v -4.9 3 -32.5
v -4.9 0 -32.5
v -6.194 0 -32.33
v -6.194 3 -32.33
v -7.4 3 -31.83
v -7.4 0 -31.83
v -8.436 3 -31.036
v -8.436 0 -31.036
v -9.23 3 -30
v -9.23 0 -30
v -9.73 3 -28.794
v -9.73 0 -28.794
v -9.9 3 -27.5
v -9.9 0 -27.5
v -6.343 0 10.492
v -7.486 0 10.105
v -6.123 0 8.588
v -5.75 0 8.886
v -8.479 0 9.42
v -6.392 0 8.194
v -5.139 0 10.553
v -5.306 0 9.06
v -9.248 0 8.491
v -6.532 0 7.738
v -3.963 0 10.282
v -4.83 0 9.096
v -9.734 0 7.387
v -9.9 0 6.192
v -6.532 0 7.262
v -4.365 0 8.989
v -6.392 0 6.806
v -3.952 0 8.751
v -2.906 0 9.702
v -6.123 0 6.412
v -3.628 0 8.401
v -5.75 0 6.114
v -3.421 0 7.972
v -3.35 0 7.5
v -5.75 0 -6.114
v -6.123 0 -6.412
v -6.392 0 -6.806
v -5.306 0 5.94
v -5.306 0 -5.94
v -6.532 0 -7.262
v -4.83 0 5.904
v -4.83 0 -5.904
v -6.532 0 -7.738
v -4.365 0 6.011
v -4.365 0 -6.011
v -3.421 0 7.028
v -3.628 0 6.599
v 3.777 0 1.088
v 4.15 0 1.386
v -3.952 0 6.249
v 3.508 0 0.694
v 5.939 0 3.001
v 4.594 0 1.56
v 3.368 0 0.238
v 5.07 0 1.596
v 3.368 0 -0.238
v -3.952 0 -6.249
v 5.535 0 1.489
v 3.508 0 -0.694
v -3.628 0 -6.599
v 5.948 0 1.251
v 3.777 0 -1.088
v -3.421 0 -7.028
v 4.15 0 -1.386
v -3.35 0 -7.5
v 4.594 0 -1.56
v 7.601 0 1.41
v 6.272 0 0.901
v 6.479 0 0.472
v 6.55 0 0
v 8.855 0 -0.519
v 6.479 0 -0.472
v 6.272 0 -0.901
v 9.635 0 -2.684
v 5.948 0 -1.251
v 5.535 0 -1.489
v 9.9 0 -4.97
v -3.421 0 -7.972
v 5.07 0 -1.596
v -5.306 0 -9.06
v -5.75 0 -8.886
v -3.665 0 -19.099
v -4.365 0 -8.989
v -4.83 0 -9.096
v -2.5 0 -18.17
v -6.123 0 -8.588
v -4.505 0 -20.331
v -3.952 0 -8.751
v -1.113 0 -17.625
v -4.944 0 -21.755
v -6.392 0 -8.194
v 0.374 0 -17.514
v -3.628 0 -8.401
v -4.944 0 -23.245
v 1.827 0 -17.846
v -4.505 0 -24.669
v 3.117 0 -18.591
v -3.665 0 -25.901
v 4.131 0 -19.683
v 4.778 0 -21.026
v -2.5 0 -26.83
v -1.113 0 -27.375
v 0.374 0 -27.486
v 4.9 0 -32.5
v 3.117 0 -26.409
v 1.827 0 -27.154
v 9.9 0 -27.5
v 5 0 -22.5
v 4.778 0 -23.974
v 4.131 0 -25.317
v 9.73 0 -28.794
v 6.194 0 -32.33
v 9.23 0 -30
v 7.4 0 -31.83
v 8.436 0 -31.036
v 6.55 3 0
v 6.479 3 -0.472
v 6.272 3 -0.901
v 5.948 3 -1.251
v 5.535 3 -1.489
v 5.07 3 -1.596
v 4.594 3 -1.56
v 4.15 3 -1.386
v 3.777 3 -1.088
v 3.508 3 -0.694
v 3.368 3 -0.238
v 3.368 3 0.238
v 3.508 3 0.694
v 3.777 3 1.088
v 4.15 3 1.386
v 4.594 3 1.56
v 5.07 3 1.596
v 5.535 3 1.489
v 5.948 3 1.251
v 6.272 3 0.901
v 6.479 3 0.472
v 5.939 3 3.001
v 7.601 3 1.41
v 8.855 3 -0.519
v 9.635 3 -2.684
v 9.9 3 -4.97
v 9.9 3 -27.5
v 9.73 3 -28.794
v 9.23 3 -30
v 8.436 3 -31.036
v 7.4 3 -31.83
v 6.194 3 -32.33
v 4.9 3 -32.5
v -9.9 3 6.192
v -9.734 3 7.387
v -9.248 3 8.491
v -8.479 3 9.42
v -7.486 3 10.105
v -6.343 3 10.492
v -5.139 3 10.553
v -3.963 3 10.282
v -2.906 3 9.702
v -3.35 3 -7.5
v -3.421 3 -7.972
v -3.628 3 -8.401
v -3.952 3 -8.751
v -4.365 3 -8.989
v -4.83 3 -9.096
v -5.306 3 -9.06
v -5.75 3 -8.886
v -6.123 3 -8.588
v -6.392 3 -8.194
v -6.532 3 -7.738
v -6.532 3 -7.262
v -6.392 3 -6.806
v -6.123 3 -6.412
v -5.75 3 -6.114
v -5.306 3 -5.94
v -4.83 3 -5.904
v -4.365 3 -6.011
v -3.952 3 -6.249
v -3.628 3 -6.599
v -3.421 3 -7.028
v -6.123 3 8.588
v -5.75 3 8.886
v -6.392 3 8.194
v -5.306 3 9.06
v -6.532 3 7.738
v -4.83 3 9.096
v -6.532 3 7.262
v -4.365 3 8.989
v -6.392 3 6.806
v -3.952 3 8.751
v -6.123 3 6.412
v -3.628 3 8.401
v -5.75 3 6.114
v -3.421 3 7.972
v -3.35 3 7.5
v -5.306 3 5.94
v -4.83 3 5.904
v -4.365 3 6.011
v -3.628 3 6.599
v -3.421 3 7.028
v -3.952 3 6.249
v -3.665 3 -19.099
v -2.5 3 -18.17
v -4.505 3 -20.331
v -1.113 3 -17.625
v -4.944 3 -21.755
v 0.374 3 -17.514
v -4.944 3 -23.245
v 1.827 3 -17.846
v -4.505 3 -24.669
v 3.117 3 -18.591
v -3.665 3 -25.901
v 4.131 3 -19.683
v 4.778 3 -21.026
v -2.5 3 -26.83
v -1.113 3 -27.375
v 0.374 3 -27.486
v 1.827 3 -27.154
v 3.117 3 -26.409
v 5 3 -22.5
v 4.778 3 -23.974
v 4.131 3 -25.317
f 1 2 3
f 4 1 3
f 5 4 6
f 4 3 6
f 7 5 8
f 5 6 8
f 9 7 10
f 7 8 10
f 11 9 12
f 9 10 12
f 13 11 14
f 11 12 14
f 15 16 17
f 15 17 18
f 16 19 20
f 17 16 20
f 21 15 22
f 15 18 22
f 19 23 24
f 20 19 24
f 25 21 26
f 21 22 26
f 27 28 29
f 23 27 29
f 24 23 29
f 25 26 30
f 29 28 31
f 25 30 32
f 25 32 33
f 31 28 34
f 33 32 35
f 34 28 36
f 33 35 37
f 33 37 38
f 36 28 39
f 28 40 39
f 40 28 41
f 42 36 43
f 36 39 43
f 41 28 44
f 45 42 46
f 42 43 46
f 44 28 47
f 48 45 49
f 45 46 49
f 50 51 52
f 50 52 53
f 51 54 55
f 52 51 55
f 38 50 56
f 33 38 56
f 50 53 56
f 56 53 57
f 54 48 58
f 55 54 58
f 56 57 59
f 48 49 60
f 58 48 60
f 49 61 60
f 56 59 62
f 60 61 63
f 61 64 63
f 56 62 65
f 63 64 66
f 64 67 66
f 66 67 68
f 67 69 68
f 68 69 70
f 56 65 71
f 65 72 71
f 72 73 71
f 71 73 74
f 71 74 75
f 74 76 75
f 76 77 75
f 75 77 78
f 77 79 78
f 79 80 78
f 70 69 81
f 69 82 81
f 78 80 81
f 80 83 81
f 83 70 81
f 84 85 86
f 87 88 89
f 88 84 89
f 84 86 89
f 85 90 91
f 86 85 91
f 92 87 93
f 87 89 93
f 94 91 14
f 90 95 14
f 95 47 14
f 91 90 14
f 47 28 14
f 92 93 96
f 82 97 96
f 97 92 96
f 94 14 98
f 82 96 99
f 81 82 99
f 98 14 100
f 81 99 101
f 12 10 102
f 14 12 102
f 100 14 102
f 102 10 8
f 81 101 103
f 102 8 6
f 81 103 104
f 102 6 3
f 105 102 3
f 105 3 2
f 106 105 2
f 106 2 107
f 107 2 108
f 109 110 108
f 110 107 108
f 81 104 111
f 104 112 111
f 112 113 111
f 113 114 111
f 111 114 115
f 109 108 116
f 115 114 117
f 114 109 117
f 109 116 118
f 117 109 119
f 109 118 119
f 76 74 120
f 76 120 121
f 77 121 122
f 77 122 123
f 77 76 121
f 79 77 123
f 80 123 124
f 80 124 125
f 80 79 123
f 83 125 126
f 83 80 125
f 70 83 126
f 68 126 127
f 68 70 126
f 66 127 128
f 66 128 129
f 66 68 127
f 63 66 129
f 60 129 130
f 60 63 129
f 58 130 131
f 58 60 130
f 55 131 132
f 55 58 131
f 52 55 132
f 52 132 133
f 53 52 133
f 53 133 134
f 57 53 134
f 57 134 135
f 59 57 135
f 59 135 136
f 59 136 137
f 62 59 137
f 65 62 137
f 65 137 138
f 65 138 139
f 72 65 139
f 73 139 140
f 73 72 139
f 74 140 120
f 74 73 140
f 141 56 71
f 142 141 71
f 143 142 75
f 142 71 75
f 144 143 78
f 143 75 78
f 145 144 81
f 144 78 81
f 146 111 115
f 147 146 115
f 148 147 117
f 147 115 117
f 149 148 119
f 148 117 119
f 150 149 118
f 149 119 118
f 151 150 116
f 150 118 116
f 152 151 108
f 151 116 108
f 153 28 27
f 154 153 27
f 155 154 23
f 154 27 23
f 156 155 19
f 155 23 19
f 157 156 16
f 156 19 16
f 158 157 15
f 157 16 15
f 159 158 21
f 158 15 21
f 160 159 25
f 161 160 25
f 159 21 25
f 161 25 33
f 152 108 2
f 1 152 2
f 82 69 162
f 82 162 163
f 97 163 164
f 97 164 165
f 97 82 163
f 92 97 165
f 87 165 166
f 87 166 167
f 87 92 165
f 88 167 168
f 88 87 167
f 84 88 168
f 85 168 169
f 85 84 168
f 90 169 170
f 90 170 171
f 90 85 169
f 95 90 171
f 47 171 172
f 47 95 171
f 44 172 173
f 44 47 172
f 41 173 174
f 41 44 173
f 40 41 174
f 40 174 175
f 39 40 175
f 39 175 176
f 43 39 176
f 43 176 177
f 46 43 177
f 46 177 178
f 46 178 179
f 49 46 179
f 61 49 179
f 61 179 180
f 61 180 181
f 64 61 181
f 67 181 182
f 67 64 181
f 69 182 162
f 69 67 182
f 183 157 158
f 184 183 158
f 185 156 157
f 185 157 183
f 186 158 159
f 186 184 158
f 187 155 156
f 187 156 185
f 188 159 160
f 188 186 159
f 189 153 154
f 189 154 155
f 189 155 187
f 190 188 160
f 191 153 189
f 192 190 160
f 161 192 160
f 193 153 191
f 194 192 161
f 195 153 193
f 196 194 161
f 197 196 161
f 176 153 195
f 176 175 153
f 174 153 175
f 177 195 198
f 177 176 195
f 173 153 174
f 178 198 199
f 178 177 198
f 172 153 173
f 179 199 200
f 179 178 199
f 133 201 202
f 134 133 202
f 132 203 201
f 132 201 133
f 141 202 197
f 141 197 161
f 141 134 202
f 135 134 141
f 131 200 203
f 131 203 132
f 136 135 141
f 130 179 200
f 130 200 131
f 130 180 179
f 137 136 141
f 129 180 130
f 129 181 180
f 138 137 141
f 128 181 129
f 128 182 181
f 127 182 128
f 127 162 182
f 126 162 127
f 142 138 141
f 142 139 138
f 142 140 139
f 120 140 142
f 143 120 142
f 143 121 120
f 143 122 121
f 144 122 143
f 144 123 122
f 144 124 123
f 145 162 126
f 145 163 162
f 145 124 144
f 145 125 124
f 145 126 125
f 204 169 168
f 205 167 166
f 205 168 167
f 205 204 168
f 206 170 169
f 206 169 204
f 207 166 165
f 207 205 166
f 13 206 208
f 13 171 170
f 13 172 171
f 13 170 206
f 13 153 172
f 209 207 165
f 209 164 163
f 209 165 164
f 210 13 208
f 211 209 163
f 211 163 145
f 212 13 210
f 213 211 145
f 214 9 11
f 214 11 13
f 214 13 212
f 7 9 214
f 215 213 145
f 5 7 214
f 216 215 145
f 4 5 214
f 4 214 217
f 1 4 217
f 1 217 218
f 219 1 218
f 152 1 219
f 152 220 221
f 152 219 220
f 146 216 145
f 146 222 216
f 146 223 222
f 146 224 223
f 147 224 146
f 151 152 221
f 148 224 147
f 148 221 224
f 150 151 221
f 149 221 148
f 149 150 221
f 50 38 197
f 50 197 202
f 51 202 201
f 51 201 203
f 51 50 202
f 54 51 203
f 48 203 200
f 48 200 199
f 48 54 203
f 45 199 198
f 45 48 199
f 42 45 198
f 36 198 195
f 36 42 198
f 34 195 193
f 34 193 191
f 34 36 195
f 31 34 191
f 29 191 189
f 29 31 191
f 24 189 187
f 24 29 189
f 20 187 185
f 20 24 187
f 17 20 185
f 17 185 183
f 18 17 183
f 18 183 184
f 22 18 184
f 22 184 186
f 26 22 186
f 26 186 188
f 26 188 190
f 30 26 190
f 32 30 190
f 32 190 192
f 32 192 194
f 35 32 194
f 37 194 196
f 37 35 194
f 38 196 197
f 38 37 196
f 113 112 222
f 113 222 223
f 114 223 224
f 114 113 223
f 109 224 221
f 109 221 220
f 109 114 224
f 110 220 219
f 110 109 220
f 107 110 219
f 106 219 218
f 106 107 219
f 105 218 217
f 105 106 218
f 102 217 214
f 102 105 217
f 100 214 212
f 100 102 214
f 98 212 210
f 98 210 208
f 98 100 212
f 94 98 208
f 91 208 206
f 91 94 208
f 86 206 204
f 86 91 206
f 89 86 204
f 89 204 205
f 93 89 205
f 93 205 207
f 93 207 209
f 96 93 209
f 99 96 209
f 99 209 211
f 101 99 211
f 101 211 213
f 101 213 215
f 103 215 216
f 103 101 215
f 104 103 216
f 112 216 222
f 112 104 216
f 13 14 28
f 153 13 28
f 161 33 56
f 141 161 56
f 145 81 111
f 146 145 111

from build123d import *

# Parameters (mm, degrees)
SKETCH1_R           = 1.6
SKETCH1_R_2         = 5
BOSS_EXTRUDE1_DEPTH = 3


with BuildPart() as part:
    # Sketch1 → Boss-Extrude1 (new body)
    with BuildSketch(Plane(origin=(0, 0, 0), x_dir=(1, 0, 0), z_dir=(0, 1, 0))):
        with BuildLine():
            Line((-9.9, 27.5), (-9.9, -6.192201576))
            ThreePointArc((-9.9, -6.192201576), (-7.485730167, -10.104724514), (-2.905997097, -9.701512952))
            Line((-2.905997097, -9.701512952), (5.93857688, -3.001078121))
            ThreePointArc((5.93857688, -3.001078121), (8.855047984, 0.519324784), (9.9, 4.96984336))
            Line((9.9, 4.96984336), (9.9, 27.5))
            ThreePointArc((9.9, 27.5), (8.435533906, 31.035533906), (4.9, 32.5))
            Line((4.9, 32.5), (-4.9, 32.5))
            ThreePointArc((-4.9, 32.5), (-8.435533906, 31.035533906), (-9.9, 27.5))
        make_face()
        with Locations((-4.95, 7.5)):
            Circle(SKETCH1_R, mode=Mode.SUBTRACT)
        with Locations((-4.95, -7.5)):
            Circle(SKETCH1_R, mode=Mode.SUBTRACT)
        with Locations((4.95, 0)):
            Circle(SKETCH1_R, mode=Mode.SUBTRACT)
        with Locations((0, 22.5)):
            Circle(SKETCH1_R_2, mode=Mode.SUBTRACT)
    extrude(amount=BOSS_EXTRUDE1_DEPTH)


solid = part.part
